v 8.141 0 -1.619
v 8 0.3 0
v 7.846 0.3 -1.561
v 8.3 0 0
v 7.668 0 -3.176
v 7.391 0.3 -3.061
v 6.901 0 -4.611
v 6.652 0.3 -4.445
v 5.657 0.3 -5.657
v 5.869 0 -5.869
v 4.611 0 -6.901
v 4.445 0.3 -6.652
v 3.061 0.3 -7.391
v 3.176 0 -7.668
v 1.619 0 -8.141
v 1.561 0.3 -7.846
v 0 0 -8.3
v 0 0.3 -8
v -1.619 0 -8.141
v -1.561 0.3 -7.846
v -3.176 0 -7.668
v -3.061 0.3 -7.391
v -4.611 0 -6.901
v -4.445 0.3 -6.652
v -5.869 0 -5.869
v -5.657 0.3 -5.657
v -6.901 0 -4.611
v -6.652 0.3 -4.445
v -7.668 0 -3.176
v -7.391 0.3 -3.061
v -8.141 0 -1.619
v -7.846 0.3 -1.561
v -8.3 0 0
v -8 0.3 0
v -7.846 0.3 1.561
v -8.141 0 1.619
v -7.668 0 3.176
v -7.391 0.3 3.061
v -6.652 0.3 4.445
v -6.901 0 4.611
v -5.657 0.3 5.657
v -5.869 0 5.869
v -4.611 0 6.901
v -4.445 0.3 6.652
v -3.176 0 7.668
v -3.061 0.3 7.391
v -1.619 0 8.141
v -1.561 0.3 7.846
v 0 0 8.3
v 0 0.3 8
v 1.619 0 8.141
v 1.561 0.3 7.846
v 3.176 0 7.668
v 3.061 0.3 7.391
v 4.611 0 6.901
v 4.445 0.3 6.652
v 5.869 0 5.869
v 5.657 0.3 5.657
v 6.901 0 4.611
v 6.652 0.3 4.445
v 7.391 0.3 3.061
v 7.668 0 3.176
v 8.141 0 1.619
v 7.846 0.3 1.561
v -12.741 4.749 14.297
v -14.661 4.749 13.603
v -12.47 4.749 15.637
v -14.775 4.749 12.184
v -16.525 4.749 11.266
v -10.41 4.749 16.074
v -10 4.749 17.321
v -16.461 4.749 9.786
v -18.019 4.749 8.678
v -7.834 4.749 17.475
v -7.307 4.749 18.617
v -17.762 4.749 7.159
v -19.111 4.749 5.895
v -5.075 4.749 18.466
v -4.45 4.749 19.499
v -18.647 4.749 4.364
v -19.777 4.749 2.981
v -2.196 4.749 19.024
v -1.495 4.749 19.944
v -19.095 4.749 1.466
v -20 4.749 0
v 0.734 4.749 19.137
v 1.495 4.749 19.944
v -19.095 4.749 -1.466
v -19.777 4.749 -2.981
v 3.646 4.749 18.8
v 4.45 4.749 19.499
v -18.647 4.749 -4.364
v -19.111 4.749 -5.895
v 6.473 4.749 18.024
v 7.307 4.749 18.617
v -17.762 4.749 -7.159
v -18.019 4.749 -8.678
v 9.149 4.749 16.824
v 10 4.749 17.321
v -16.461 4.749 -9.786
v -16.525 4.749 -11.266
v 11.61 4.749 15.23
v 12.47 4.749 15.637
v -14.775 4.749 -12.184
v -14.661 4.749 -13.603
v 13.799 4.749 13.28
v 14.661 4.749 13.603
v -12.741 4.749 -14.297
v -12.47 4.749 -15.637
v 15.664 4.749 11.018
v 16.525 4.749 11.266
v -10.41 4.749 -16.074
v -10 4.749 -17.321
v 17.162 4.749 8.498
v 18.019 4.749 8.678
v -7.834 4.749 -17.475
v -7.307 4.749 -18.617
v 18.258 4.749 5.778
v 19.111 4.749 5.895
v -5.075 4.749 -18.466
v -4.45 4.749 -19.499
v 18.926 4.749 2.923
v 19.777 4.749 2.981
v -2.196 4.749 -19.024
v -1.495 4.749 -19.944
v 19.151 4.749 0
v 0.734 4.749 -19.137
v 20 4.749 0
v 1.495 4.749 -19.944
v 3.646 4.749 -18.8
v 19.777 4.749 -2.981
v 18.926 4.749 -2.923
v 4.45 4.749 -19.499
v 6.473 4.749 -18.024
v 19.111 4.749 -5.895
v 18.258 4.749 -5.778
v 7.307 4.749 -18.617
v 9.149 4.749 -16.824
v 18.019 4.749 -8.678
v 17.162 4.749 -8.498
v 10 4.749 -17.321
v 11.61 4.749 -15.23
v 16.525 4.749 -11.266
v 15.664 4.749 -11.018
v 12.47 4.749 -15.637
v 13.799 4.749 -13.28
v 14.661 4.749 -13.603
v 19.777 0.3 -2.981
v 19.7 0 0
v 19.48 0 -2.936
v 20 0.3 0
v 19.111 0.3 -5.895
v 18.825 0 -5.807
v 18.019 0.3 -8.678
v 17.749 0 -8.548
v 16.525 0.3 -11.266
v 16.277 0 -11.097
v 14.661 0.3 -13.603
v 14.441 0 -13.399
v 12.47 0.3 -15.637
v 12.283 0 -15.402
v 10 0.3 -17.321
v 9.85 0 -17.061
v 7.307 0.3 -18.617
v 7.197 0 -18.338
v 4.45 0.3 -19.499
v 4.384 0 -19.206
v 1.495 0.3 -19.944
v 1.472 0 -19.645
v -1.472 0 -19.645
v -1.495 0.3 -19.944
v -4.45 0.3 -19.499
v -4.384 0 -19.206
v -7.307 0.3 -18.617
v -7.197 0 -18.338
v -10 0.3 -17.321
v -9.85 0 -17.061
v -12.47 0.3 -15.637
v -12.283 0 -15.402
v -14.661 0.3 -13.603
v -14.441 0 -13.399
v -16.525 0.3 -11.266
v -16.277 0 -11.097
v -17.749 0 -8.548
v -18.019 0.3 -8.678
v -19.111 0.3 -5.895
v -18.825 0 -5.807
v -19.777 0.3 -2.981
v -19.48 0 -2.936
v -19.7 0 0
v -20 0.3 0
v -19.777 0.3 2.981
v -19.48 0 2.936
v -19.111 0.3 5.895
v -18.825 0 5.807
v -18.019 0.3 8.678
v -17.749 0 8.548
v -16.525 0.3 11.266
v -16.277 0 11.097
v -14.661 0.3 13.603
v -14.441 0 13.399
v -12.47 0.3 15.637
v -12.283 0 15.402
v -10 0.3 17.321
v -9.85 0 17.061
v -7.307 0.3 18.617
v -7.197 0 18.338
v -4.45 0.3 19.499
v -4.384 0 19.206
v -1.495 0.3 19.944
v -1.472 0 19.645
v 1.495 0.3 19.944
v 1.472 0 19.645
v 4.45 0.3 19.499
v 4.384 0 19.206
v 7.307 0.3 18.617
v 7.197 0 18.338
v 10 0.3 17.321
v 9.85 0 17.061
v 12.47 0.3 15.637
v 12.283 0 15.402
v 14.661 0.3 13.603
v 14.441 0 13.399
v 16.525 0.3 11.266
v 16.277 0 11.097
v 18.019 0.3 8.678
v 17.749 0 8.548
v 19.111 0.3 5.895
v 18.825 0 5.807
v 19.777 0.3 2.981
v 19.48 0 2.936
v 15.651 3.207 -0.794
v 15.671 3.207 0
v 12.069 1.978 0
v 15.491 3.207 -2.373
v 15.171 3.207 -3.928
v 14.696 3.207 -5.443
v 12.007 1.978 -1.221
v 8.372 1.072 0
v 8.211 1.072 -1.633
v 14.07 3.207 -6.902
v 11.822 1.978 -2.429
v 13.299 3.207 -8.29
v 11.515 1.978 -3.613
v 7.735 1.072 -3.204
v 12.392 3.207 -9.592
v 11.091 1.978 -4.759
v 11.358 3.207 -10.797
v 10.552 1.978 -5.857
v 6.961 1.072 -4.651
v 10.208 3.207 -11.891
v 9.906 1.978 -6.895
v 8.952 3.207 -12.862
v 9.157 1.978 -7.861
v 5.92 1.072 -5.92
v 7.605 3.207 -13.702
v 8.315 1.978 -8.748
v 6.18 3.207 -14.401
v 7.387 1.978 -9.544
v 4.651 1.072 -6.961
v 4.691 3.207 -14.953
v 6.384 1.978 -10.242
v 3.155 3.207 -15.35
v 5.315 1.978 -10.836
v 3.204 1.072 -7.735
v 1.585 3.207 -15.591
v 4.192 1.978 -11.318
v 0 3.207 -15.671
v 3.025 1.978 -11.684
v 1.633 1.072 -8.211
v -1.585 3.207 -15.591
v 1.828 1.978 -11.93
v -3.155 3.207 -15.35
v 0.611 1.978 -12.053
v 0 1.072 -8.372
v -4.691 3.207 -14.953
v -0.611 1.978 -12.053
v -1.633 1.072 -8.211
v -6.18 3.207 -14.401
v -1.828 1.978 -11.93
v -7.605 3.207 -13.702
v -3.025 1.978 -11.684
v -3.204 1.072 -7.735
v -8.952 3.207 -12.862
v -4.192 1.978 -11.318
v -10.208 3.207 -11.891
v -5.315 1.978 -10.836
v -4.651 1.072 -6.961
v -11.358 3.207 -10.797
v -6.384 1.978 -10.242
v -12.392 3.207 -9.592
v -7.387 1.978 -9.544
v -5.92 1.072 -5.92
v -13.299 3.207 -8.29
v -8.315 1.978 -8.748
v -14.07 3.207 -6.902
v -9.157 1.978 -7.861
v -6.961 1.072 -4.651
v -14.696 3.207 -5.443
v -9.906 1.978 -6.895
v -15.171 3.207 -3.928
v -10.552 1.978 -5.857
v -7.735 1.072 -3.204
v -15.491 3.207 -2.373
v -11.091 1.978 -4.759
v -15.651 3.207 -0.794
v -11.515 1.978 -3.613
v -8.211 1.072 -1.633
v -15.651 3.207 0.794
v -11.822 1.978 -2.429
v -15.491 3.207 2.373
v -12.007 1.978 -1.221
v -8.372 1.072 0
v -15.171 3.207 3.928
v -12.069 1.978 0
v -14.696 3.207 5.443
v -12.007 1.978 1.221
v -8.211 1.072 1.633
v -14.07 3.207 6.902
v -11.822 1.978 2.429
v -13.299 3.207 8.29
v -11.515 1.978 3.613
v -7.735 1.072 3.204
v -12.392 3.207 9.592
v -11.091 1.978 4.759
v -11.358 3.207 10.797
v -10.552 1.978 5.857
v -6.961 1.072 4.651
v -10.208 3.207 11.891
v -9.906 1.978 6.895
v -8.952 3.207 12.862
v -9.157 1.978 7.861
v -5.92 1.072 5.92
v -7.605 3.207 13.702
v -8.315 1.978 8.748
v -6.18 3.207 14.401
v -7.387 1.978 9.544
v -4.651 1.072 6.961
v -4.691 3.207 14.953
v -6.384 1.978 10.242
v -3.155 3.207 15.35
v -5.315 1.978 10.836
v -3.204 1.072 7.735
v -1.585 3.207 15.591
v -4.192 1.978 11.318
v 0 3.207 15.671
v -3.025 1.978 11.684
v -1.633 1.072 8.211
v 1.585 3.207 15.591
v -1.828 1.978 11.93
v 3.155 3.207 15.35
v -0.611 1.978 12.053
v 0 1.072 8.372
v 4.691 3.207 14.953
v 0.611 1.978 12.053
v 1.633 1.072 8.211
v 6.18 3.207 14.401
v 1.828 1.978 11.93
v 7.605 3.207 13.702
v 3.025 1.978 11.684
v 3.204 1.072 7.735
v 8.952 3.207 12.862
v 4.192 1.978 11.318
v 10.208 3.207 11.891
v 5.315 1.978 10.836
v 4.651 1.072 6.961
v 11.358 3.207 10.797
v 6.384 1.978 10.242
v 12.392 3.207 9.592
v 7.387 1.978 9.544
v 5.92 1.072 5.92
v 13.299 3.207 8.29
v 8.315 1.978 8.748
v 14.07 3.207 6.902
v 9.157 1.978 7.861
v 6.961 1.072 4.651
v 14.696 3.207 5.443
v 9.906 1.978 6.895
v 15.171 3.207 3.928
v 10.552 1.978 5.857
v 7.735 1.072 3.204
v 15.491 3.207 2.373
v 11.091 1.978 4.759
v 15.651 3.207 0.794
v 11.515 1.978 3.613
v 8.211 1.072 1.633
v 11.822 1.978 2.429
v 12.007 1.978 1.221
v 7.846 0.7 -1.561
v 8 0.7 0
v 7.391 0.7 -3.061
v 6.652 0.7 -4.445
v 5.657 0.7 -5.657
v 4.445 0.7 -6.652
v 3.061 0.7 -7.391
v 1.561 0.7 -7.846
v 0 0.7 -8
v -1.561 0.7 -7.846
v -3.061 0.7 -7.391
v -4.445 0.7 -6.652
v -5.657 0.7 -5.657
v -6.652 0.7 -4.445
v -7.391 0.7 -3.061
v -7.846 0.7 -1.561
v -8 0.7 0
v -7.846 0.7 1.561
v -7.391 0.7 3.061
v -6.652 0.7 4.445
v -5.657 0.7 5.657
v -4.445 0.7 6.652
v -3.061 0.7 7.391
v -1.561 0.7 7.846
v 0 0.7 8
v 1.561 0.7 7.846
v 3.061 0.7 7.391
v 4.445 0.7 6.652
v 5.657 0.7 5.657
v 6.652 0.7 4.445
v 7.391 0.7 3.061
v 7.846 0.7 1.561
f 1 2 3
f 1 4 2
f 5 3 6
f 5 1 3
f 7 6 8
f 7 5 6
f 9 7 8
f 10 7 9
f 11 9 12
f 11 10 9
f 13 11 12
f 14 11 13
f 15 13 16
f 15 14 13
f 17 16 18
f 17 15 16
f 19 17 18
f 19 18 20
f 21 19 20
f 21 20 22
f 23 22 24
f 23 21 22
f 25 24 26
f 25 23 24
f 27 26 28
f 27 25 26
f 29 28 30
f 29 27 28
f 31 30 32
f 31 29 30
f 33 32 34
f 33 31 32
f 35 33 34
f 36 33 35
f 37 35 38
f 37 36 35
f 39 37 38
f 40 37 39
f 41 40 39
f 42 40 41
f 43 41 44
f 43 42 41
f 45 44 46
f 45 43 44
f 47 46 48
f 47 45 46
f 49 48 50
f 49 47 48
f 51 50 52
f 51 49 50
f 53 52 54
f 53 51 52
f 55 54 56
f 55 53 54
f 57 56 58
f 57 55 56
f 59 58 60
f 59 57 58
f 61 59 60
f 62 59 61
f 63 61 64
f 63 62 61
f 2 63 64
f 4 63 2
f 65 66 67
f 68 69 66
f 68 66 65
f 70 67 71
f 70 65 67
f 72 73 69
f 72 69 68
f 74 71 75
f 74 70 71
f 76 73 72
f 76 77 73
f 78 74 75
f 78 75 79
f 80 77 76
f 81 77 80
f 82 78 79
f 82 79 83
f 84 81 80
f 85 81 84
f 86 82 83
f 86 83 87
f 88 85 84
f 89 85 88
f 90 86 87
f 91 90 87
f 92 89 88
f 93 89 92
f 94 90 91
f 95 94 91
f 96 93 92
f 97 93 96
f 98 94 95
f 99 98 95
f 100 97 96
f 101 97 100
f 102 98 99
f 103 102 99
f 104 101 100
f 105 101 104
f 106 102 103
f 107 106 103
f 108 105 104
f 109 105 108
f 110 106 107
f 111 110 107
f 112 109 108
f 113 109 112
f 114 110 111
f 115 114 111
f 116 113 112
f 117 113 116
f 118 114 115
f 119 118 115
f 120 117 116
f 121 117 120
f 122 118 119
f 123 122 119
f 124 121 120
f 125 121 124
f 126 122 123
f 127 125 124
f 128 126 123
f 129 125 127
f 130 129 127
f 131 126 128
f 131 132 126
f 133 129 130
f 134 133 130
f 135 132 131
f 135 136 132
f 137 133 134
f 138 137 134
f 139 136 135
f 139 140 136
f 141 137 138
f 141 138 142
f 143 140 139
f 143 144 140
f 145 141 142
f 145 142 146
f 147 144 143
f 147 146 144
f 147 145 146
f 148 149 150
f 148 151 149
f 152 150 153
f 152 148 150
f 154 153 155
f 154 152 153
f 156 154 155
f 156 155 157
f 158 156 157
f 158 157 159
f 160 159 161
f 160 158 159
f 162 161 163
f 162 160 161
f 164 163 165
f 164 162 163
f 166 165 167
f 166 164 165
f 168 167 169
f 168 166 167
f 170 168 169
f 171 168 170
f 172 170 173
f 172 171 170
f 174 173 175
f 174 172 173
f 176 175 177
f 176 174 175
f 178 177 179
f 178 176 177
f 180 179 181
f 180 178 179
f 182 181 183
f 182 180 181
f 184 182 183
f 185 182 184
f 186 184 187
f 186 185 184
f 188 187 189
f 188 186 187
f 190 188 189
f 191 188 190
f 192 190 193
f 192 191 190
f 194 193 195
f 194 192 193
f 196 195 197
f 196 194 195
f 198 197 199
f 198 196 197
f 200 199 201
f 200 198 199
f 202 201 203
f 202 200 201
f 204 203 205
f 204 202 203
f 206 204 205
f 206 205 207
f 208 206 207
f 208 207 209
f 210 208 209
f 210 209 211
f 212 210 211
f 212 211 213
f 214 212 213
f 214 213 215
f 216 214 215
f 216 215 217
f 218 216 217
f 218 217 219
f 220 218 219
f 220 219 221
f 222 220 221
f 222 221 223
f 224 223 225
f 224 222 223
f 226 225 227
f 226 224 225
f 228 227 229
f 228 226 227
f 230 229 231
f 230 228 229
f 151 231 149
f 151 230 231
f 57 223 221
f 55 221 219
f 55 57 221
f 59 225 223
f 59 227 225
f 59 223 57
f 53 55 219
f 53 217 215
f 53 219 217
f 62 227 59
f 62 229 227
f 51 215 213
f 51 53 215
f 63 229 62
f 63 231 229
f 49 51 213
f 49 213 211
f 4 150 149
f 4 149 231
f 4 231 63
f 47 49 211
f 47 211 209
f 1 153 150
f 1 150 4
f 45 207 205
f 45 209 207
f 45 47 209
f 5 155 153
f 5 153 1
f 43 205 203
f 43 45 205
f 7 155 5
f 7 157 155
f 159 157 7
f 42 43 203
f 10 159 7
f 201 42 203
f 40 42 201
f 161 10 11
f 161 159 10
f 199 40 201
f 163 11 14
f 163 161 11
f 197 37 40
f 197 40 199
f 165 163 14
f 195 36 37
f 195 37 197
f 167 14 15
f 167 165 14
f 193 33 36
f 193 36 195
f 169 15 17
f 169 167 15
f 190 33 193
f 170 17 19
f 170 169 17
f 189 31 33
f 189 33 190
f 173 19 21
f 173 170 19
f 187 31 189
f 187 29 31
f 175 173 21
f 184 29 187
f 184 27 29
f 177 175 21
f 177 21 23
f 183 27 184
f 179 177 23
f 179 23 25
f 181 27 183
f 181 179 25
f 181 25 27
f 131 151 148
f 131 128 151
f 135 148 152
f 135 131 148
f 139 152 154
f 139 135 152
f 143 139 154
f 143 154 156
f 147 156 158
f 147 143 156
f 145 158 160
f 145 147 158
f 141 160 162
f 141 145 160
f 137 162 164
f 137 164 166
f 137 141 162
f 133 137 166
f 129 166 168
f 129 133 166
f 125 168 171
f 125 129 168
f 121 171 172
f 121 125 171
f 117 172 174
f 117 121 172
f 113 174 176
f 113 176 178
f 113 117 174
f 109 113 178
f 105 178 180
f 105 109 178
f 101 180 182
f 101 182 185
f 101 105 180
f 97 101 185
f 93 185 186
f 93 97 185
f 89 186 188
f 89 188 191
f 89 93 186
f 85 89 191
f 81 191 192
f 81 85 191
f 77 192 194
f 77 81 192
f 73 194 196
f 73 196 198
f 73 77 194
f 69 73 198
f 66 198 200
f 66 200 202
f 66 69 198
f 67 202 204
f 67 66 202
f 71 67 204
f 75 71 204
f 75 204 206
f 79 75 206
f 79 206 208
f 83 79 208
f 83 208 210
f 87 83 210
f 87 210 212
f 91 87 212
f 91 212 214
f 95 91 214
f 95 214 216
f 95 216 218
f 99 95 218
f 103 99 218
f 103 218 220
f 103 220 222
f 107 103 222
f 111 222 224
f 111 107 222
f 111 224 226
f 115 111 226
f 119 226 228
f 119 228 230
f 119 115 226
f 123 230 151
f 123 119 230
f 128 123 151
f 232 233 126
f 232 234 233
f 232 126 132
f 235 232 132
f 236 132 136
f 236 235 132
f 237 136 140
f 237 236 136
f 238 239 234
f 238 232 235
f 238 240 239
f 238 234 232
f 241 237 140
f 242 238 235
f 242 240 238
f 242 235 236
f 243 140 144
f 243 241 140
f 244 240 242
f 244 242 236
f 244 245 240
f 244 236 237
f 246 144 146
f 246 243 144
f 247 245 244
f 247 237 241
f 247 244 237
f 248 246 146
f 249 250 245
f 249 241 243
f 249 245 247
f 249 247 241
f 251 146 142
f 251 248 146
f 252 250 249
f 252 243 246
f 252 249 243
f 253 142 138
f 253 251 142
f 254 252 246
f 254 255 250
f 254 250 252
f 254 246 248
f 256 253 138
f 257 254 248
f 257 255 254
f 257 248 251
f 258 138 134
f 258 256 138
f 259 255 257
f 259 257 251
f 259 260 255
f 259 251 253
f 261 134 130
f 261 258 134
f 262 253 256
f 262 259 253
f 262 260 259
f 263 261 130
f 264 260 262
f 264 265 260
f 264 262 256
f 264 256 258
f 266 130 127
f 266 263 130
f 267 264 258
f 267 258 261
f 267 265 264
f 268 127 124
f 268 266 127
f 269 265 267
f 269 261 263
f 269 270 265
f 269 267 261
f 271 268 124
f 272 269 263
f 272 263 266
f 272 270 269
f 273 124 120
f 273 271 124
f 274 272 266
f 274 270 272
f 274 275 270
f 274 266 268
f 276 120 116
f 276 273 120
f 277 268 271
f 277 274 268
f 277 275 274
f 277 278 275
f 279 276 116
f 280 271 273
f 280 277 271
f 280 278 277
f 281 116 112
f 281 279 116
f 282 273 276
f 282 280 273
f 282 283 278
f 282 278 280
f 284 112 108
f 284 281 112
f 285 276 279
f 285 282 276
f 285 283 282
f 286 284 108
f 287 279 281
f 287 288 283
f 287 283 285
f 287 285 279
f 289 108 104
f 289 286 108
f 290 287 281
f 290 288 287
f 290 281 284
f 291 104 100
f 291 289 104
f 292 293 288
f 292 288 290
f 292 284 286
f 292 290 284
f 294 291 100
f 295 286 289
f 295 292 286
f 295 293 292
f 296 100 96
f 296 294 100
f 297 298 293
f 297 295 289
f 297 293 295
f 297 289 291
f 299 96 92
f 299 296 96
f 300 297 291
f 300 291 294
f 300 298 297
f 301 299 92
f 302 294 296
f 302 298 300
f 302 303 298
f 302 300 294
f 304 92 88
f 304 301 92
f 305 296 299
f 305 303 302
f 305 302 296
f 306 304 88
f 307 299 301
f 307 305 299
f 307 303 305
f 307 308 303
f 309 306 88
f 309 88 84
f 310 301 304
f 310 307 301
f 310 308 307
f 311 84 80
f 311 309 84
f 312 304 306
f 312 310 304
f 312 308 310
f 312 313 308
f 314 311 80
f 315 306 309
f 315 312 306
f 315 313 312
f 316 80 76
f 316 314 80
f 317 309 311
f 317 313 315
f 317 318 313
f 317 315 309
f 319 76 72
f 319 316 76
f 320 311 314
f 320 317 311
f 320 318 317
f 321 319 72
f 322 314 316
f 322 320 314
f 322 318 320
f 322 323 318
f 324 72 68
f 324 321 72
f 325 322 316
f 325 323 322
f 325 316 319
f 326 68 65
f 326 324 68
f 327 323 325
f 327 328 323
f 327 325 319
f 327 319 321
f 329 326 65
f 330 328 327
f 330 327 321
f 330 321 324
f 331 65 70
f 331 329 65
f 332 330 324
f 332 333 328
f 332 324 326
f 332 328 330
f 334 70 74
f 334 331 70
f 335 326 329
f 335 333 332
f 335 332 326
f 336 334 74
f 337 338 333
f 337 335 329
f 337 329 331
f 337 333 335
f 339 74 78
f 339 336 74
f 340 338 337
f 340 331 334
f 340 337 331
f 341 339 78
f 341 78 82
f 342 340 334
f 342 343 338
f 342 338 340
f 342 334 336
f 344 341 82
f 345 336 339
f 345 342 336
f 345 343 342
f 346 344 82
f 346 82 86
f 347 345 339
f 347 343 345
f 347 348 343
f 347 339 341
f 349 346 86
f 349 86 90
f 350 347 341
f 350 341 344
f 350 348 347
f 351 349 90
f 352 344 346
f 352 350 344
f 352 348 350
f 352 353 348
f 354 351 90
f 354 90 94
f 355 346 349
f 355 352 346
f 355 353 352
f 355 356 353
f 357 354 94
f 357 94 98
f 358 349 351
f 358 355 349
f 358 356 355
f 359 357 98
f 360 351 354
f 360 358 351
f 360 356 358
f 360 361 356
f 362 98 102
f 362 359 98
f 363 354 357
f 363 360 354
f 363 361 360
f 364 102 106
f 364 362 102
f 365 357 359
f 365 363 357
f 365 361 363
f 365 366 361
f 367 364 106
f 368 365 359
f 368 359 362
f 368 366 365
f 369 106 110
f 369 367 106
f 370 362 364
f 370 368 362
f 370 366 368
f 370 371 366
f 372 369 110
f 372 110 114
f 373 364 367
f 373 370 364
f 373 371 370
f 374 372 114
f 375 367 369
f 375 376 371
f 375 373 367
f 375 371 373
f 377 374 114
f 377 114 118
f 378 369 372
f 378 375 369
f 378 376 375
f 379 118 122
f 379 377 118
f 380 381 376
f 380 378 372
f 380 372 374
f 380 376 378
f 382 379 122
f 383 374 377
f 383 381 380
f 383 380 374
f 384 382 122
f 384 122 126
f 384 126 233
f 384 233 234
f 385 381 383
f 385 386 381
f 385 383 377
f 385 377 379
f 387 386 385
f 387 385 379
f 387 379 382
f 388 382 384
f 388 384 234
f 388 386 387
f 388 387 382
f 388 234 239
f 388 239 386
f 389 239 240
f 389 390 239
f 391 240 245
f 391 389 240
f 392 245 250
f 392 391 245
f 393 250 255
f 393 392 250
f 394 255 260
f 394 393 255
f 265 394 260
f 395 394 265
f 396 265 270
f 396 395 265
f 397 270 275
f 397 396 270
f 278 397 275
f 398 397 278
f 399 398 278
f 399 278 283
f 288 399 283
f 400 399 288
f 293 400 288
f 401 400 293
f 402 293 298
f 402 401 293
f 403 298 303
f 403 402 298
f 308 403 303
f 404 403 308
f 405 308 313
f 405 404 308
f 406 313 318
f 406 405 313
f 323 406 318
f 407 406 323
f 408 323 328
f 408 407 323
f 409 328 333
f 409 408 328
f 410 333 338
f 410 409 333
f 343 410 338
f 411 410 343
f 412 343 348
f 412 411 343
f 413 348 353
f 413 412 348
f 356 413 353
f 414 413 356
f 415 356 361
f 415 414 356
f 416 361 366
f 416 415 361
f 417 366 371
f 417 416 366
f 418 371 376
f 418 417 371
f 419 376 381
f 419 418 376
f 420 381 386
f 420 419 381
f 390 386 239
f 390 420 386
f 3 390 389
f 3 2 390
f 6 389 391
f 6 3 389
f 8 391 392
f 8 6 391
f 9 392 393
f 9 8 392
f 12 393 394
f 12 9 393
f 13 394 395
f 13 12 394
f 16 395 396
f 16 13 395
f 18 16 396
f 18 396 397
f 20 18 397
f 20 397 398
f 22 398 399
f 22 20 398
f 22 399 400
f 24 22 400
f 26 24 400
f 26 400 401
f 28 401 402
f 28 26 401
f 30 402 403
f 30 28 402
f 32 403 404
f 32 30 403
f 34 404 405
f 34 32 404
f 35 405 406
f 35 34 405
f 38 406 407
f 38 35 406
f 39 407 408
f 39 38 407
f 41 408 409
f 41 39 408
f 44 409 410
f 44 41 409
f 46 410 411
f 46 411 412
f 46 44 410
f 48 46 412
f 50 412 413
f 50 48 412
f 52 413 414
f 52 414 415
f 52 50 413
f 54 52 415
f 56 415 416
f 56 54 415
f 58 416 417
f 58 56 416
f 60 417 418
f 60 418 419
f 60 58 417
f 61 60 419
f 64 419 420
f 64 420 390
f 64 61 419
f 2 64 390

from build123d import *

# Parameters (mm, degrees)
SFAZOWANIE1_SIZE = 0.3


with BuildPart() as part:
    # Szkic1 → Obrót1 (revolve)
    with BuildSketch(Plane.XY):
        with BuildLine():
            Line((8, 0), (20, 0))
            Line((20, 0), (20, 4.749260349))
            Line((20, 4.749260349), (19.150718002, 4.749260349))
            ThreePointArc((19.150718002, 4.749260349), (13.704182219, 2.491495571), (8, 1))
            Line((8, 1), (8, 0))
        make_face()
    revolve(axis=Axis((0, 0.249260349, 0), (0, 1, 0)))

    # Sfazowanie1
    # the kernel refuses this chamfer: 0.37665047, 0.3 mm, written as the material it takes off along each edge
    with BuildSketch(Plane(origin=(0, 0, 0), x_dir=(1, 0, 0), z_dir=(0, 0, 1))) as sfazowanie1_piece_1:
        Polygon((20 - SFAZOWANIE1_SIZE, 0), (20, SFAZOWANIE1_SIZE), (20, 0), align=None)
    revolve(axis=Axis((0, 0, 0), (0, 1, 0)), mode=Mode.SUBTRACT)
    with BuildSketch(Plane(origin=(0, 0, 0), x_dir=(1, 0, 0), z_dir=(0, 0, 1))) as sfazowanie1_piece_2:
        Polygon((8, SFAZOWANIE1_SIZE), (8 + SFAZOWANIE1_SIZE, 0), (8, 0), align=None)
    revolve(axis=Axis((0, 0, 0), (0, 1, 0)), mode=Mode.SUBTRACT)
    with BuildSketch(Plane(origin=(0, 1, 0), x_dir=(1, 0, 0), z_dir=(0, 0, 1))) as sfazowanie1_piece_3:
        with BuildLine():
            Line((8.372172674, 0.072172674), (8, -SFAZOWANIE1_SIZE))
            Line((8, -SFAZOWANIE1_SIZE), (8, 0))
            ThreePointArc((8, 0), (8.192295557, 0.036865326), (8.372172674, 0.072172674))
        make_face()
    revolve(axis=Axis((0, 1, 0), (0, 1, 0)), mode=Mode.SUBTRACT)


solid = part.part
